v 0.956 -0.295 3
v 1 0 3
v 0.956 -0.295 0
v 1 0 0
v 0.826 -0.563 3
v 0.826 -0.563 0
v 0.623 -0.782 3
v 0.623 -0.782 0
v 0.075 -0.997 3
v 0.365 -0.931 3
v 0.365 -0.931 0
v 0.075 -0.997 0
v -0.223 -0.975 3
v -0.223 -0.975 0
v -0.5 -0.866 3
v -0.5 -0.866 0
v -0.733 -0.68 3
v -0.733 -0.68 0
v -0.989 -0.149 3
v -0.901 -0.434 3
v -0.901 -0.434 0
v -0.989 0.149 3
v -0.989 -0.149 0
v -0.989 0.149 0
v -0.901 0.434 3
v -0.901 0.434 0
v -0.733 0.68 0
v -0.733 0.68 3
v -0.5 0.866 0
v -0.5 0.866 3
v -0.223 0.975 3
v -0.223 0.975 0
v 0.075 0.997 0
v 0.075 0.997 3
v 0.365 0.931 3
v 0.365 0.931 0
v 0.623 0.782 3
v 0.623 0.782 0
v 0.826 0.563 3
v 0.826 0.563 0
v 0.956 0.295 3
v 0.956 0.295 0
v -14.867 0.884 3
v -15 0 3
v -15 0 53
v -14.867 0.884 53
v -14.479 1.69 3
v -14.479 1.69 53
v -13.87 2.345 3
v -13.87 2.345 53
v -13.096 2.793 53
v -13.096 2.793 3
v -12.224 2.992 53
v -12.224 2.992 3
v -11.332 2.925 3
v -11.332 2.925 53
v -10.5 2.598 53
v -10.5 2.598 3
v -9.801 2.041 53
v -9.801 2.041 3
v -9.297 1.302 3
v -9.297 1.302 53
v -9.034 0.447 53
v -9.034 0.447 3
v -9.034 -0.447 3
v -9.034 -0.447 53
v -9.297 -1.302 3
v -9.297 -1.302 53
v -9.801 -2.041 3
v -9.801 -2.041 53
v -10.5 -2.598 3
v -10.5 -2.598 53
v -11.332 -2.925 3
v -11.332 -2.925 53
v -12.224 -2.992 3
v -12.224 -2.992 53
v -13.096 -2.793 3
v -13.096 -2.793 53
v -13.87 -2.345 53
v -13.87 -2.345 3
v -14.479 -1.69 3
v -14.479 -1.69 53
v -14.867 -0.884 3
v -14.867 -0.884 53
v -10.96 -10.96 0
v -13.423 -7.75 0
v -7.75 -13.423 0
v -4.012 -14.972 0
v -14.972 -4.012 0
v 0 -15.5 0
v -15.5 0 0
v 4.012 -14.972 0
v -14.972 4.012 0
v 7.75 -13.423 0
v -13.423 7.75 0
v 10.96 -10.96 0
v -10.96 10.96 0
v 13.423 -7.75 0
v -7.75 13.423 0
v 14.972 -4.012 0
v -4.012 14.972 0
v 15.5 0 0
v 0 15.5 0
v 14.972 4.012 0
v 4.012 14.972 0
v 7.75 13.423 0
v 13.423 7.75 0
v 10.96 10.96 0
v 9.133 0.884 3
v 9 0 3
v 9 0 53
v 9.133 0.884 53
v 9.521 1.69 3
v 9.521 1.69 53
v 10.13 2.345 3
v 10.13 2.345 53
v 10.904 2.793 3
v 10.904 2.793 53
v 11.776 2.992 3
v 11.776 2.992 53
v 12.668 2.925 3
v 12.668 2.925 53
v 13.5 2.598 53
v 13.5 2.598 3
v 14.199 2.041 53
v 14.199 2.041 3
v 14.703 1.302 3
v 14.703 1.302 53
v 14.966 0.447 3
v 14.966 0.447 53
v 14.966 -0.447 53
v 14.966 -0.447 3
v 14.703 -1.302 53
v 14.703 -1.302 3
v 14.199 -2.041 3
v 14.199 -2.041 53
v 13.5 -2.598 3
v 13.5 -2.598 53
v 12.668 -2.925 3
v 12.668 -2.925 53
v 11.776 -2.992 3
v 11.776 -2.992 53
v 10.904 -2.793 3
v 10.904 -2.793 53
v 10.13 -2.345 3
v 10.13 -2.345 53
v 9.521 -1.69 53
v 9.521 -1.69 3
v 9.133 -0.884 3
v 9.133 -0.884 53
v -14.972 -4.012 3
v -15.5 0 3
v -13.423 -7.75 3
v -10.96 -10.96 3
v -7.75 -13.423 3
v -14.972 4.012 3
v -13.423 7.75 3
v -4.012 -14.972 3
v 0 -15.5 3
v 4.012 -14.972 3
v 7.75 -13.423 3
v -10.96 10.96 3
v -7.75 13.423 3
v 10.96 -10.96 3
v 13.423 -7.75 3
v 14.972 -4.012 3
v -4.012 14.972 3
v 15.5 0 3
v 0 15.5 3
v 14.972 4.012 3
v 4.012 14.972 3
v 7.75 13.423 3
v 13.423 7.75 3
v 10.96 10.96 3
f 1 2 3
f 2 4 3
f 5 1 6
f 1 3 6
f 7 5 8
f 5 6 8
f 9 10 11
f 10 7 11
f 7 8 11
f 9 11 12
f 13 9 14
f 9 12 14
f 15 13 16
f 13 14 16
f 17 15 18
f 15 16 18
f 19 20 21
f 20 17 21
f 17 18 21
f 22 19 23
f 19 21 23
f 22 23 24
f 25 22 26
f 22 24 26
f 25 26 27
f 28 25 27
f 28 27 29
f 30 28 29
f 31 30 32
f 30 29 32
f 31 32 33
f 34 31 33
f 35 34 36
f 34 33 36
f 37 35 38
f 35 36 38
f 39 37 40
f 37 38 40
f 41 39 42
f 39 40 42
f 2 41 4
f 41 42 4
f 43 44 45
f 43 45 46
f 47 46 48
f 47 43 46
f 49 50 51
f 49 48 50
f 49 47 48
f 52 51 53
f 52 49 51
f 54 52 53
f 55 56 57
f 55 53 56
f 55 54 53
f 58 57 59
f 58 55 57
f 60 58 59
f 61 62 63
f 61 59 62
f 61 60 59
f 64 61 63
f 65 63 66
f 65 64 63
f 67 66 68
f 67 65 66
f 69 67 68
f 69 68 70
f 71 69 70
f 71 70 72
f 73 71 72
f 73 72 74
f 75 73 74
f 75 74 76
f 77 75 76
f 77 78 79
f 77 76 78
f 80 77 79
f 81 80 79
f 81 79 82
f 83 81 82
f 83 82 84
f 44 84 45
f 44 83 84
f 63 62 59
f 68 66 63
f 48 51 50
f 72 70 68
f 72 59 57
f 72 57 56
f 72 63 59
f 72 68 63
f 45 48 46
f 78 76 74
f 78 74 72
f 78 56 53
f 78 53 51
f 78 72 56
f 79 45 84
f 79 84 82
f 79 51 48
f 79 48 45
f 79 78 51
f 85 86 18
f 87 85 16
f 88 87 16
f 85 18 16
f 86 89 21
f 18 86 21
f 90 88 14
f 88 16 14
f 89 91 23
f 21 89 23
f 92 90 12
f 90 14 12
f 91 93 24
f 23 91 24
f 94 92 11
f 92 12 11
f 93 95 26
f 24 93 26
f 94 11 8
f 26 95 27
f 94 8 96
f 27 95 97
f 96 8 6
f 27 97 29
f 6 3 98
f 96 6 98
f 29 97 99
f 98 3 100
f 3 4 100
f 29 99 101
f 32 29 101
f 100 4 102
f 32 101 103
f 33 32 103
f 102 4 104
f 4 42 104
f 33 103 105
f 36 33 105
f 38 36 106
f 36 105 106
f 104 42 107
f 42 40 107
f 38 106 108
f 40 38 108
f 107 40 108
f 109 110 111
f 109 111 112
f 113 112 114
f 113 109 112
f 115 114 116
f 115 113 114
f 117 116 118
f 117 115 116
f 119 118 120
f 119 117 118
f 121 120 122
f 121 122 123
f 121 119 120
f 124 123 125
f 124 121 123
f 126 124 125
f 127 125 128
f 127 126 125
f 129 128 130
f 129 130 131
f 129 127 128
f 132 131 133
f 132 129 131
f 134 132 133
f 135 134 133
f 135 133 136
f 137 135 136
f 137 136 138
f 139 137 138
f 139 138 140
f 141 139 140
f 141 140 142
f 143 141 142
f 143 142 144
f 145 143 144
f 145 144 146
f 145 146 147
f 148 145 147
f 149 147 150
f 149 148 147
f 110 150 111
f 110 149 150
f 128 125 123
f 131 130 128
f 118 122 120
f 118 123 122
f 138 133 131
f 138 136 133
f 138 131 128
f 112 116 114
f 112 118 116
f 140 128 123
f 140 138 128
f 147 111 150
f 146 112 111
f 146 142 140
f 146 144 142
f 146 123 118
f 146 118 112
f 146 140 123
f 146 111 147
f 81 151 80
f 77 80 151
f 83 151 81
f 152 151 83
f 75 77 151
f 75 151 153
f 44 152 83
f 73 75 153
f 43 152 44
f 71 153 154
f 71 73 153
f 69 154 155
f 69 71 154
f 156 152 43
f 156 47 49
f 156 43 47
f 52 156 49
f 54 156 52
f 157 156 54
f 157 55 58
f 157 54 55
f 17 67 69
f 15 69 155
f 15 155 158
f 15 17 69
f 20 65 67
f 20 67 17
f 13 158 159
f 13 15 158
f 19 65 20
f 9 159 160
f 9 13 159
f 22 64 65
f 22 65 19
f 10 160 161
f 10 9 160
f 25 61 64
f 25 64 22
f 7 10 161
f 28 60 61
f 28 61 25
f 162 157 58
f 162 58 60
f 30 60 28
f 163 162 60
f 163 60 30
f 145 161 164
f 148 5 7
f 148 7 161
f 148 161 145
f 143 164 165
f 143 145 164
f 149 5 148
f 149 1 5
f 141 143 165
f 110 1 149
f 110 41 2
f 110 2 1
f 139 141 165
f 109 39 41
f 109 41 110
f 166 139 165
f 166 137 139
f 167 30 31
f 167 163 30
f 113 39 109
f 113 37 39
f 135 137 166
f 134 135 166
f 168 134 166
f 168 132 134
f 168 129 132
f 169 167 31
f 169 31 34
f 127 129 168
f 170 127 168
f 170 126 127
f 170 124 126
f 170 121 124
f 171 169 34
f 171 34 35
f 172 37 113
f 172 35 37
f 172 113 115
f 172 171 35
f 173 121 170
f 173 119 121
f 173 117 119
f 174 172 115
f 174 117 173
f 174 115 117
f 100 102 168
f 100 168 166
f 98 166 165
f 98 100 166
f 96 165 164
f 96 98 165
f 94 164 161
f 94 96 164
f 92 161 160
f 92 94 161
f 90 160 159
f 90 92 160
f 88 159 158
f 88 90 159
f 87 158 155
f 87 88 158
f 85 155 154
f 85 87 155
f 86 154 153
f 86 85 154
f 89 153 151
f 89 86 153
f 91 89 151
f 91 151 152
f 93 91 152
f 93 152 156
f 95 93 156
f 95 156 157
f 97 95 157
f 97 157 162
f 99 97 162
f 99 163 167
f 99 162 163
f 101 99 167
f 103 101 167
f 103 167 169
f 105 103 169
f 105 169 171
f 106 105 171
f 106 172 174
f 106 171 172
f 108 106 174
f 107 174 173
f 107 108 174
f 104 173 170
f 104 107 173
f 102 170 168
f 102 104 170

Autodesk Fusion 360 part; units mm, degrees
sketch "Sketch1" plane through (0, 0, 0) normal (0, 0, 1) x (1, 0, 0)
  circle A0 centre (0, 0) radius 15.5
  circle A1 centre (0, 0) radius 1
  dimension "d1" = 31
  dimension "d2" = 2
extrude "Extrude1" add sketch "Sketch1" along normal blind 3
sketch "Sketch2" plane through (0, 0, 3) normal (0, 0, 1) x (-1, 0, 0)
  circle A0 centre (0, 0) radius 1
  circle A1 centre (0, 0) radius 15.5
  circle A2 centre (12, 0) radius 3
  circle A3 centre (-12, 0) radius 3
  line L0 (15.5, 0) -> (12, 0)
  line L1 (-12, 0) -> (-15.5, 0)
  dimension "d7" = 6
extrude "Extrude2" add sketch "Sketch2" along normal blind 50 contours A3 | A2
